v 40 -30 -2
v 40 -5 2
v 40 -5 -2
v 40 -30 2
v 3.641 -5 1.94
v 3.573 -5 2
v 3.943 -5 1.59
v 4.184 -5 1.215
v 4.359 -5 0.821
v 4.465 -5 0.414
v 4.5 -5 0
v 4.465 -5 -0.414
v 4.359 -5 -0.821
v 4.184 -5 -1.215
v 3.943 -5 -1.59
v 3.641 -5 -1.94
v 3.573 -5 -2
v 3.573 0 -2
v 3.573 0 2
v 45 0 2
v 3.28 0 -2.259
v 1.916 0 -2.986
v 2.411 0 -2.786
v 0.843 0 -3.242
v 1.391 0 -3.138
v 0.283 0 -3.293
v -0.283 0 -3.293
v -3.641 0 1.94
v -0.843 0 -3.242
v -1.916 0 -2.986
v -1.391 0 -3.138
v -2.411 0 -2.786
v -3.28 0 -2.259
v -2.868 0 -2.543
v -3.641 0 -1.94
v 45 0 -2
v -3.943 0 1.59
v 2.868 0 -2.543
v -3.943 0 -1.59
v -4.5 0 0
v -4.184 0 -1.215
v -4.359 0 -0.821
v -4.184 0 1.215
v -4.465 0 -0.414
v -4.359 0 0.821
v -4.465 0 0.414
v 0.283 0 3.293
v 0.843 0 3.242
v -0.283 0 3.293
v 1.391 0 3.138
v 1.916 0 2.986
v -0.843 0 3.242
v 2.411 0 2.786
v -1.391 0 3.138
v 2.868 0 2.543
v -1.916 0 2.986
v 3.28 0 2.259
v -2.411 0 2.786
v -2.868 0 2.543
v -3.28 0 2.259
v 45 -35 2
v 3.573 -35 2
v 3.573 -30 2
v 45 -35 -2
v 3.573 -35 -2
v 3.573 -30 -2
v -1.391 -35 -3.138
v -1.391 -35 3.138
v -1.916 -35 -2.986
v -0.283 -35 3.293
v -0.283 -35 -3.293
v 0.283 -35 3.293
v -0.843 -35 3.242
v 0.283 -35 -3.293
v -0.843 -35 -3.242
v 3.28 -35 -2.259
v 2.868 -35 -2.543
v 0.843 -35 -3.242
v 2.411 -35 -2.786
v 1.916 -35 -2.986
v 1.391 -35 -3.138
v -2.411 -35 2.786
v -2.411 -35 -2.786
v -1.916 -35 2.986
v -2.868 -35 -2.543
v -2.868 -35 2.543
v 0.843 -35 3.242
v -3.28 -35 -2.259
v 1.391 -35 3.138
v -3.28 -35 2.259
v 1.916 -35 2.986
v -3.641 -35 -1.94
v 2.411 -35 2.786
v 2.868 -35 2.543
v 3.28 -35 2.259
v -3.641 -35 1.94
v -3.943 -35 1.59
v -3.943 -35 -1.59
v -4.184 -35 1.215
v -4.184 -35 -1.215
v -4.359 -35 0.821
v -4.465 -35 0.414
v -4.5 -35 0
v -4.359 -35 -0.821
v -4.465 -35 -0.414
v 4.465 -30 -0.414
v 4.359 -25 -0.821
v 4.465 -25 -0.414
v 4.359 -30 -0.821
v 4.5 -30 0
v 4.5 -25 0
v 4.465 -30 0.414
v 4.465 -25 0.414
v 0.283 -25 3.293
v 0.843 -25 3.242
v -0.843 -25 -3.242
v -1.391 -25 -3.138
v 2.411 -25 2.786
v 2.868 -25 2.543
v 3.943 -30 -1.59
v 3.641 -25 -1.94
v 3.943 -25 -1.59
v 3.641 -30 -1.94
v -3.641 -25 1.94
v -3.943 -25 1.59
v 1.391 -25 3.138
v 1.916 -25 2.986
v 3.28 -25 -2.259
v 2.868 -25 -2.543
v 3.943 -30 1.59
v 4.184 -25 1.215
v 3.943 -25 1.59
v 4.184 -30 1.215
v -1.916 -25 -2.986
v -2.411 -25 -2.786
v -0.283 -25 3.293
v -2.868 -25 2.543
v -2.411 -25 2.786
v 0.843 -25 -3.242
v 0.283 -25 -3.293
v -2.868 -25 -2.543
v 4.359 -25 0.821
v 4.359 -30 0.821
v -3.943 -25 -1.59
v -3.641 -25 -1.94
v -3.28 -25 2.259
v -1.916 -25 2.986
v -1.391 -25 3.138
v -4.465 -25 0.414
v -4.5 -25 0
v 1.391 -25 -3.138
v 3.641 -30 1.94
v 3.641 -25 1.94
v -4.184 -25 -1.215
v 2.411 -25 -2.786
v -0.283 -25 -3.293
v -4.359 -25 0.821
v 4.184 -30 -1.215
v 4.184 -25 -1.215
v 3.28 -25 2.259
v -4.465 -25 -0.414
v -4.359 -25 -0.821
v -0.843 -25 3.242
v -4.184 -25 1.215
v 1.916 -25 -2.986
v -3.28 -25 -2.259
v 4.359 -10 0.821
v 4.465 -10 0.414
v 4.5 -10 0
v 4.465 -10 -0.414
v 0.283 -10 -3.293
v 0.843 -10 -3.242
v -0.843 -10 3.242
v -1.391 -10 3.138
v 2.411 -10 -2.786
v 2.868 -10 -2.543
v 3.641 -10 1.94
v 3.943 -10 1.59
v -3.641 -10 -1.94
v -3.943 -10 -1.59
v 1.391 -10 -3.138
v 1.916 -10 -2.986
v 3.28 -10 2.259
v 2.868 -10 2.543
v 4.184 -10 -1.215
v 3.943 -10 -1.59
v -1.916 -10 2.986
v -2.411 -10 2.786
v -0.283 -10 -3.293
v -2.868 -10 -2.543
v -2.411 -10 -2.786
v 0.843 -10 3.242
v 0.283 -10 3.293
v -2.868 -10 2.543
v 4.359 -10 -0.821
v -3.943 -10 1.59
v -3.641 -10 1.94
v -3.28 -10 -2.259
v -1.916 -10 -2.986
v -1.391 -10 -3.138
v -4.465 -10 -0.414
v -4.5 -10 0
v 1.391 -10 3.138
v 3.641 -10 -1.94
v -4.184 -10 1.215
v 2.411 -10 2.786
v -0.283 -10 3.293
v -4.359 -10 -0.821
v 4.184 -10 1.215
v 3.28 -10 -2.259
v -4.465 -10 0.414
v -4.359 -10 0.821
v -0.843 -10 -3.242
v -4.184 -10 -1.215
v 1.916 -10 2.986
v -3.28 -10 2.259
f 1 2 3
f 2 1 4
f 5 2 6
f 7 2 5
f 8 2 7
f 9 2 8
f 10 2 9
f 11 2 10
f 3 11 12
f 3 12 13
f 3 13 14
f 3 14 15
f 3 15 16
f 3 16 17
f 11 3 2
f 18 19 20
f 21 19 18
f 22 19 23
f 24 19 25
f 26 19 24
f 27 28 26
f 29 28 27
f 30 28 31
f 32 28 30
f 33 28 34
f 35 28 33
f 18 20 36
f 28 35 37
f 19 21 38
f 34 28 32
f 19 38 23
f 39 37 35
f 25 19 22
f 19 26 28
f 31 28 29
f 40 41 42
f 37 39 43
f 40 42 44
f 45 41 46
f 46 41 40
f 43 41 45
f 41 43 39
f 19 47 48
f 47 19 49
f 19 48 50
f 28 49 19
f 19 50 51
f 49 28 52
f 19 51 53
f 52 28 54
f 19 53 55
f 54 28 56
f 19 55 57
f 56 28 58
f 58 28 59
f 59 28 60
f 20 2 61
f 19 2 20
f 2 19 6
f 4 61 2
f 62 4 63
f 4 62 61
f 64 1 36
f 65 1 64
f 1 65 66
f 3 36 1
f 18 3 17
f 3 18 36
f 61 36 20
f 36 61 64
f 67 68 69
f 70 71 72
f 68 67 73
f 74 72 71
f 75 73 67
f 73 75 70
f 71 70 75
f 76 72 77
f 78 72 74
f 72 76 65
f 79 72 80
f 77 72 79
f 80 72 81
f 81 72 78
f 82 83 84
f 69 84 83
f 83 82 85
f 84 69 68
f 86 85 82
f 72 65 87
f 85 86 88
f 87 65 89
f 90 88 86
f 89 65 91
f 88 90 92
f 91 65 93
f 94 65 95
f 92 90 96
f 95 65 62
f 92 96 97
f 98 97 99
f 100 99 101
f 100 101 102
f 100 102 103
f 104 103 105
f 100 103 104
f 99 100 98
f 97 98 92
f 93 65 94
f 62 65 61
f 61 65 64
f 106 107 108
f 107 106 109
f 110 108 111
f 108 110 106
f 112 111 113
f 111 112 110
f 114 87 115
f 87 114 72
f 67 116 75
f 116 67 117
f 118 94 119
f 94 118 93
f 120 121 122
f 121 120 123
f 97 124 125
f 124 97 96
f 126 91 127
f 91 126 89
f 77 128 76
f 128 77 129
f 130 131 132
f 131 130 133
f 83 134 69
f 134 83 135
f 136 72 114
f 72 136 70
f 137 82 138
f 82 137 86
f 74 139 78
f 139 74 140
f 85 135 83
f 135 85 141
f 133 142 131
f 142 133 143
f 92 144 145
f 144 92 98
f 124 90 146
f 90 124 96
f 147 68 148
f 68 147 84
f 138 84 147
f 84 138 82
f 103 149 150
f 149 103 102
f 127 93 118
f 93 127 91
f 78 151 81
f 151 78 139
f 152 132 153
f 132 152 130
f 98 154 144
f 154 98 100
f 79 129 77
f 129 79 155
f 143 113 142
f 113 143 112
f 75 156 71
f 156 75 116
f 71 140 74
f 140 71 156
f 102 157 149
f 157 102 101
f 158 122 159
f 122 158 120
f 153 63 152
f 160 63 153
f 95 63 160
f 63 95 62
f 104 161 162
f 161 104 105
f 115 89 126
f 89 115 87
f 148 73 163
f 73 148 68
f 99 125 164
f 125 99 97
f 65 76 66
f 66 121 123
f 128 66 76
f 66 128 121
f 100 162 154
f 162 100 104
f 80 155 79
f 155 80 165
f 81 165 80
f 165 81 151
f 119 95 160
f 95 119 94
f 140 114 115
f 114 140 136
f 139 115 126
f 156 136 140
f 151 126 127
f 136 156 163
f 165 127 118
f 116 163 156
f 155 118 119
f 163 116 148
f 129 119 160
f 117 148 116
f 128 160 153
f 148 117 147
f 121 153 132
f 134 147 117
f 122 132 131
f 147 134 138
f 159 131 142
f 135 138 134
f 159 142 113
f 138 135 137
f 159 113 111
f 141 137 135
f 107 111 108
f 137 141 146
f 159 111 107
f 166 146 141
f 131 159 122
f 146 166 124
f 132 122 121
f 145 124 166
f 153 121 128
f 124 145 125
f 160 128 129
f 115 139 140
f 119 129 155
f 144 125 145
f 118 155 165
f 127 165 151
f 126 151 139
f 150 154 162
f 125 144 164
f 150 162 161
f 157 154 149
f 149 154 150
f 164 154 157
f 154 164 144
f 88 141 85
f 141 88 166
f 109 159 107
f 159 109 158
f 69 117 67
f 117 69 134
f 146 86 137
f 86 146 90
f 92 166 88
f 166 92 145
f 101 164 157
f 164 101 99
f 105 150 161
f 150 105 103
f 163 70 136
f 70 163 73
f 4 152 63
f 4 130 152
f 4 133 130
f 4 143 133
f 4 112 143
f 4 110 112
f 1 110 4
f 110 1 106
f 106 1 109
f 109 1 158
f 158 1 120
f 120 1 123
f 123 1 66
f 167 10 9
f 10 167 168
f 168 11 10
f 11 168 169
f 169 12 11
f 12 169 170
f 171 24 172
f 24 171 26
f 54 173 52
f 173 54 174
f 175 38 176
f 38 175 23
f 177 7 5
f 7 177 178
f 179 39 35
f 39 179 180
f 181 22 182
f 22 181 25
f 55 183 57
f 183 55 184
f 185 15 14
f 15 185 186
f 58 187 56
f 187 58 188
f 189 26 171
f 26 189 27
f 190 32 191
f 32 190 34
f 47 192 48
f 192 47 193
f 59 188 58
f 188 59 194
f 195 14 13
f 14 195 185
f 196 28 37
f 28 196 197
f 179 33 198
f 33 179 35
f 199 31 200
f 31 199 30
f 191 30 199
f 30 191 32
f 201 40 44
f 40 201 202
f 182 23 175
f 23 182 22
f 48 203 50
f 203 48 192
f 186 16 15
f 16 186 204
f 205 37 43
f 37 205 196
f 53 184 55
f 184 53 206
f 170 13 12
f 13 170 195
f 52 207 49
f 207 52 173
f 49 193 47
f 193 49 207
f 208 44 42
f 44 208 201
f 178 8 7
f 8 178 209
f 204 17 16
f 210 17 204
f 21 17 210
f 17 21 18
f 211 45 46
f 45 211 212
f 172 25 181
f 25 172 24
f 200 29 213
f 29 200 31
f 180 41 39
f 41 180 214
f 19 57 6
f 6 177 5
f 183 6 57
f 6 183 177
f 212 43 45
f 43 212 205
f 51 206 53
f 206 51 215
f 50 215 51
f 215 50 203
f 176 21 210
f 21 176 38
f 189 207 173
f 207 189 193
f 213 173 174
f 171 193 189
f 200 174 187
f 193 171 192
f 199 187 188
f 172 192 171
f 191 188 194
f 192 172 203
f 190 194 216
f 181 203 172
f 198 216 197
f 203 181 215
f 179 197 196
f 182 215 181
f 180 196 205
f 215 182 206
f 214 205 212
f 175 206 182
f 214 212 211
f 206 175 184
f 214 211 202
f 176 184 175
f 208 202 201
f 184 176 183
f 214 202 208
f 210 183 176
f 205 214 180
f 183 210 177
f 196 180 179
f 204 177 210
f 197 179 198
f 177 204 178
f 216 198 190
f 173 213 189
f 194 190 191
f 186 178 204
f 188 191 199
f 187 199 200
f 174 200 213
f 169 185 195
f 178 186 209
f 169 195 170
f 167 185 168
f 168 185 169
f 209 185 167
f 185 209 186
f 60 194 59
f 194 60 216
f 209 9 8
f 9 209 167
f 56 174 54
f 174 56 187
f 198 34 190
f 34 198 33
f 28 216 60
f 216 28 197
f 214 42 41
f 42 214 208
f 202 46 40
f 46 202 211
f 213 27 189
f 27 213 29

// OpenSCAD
$fn = 50;

r1 = 3.3;
r2 = 4.5;
h = 10;

l = 40;
b = 5;
t = 4;

bl = 25;


rotate([90,0,0]){
	scale([r2/r1,1,1]) cylinder(h,r1,r1);
	translate([0,-t/2,0]) {
		cube([l,t,b]);
		translate([l,0,0]) cube([b,t,bl+2*b]);
	}
	
	translate([0,0,bl+2*b])
	rotate([180,0,0]){
		scale([r2/r1,1,1]) cylinder(h,r1,r1);
		translate([0,-t/2,0]) cube([l,t,b]);
	}

}
